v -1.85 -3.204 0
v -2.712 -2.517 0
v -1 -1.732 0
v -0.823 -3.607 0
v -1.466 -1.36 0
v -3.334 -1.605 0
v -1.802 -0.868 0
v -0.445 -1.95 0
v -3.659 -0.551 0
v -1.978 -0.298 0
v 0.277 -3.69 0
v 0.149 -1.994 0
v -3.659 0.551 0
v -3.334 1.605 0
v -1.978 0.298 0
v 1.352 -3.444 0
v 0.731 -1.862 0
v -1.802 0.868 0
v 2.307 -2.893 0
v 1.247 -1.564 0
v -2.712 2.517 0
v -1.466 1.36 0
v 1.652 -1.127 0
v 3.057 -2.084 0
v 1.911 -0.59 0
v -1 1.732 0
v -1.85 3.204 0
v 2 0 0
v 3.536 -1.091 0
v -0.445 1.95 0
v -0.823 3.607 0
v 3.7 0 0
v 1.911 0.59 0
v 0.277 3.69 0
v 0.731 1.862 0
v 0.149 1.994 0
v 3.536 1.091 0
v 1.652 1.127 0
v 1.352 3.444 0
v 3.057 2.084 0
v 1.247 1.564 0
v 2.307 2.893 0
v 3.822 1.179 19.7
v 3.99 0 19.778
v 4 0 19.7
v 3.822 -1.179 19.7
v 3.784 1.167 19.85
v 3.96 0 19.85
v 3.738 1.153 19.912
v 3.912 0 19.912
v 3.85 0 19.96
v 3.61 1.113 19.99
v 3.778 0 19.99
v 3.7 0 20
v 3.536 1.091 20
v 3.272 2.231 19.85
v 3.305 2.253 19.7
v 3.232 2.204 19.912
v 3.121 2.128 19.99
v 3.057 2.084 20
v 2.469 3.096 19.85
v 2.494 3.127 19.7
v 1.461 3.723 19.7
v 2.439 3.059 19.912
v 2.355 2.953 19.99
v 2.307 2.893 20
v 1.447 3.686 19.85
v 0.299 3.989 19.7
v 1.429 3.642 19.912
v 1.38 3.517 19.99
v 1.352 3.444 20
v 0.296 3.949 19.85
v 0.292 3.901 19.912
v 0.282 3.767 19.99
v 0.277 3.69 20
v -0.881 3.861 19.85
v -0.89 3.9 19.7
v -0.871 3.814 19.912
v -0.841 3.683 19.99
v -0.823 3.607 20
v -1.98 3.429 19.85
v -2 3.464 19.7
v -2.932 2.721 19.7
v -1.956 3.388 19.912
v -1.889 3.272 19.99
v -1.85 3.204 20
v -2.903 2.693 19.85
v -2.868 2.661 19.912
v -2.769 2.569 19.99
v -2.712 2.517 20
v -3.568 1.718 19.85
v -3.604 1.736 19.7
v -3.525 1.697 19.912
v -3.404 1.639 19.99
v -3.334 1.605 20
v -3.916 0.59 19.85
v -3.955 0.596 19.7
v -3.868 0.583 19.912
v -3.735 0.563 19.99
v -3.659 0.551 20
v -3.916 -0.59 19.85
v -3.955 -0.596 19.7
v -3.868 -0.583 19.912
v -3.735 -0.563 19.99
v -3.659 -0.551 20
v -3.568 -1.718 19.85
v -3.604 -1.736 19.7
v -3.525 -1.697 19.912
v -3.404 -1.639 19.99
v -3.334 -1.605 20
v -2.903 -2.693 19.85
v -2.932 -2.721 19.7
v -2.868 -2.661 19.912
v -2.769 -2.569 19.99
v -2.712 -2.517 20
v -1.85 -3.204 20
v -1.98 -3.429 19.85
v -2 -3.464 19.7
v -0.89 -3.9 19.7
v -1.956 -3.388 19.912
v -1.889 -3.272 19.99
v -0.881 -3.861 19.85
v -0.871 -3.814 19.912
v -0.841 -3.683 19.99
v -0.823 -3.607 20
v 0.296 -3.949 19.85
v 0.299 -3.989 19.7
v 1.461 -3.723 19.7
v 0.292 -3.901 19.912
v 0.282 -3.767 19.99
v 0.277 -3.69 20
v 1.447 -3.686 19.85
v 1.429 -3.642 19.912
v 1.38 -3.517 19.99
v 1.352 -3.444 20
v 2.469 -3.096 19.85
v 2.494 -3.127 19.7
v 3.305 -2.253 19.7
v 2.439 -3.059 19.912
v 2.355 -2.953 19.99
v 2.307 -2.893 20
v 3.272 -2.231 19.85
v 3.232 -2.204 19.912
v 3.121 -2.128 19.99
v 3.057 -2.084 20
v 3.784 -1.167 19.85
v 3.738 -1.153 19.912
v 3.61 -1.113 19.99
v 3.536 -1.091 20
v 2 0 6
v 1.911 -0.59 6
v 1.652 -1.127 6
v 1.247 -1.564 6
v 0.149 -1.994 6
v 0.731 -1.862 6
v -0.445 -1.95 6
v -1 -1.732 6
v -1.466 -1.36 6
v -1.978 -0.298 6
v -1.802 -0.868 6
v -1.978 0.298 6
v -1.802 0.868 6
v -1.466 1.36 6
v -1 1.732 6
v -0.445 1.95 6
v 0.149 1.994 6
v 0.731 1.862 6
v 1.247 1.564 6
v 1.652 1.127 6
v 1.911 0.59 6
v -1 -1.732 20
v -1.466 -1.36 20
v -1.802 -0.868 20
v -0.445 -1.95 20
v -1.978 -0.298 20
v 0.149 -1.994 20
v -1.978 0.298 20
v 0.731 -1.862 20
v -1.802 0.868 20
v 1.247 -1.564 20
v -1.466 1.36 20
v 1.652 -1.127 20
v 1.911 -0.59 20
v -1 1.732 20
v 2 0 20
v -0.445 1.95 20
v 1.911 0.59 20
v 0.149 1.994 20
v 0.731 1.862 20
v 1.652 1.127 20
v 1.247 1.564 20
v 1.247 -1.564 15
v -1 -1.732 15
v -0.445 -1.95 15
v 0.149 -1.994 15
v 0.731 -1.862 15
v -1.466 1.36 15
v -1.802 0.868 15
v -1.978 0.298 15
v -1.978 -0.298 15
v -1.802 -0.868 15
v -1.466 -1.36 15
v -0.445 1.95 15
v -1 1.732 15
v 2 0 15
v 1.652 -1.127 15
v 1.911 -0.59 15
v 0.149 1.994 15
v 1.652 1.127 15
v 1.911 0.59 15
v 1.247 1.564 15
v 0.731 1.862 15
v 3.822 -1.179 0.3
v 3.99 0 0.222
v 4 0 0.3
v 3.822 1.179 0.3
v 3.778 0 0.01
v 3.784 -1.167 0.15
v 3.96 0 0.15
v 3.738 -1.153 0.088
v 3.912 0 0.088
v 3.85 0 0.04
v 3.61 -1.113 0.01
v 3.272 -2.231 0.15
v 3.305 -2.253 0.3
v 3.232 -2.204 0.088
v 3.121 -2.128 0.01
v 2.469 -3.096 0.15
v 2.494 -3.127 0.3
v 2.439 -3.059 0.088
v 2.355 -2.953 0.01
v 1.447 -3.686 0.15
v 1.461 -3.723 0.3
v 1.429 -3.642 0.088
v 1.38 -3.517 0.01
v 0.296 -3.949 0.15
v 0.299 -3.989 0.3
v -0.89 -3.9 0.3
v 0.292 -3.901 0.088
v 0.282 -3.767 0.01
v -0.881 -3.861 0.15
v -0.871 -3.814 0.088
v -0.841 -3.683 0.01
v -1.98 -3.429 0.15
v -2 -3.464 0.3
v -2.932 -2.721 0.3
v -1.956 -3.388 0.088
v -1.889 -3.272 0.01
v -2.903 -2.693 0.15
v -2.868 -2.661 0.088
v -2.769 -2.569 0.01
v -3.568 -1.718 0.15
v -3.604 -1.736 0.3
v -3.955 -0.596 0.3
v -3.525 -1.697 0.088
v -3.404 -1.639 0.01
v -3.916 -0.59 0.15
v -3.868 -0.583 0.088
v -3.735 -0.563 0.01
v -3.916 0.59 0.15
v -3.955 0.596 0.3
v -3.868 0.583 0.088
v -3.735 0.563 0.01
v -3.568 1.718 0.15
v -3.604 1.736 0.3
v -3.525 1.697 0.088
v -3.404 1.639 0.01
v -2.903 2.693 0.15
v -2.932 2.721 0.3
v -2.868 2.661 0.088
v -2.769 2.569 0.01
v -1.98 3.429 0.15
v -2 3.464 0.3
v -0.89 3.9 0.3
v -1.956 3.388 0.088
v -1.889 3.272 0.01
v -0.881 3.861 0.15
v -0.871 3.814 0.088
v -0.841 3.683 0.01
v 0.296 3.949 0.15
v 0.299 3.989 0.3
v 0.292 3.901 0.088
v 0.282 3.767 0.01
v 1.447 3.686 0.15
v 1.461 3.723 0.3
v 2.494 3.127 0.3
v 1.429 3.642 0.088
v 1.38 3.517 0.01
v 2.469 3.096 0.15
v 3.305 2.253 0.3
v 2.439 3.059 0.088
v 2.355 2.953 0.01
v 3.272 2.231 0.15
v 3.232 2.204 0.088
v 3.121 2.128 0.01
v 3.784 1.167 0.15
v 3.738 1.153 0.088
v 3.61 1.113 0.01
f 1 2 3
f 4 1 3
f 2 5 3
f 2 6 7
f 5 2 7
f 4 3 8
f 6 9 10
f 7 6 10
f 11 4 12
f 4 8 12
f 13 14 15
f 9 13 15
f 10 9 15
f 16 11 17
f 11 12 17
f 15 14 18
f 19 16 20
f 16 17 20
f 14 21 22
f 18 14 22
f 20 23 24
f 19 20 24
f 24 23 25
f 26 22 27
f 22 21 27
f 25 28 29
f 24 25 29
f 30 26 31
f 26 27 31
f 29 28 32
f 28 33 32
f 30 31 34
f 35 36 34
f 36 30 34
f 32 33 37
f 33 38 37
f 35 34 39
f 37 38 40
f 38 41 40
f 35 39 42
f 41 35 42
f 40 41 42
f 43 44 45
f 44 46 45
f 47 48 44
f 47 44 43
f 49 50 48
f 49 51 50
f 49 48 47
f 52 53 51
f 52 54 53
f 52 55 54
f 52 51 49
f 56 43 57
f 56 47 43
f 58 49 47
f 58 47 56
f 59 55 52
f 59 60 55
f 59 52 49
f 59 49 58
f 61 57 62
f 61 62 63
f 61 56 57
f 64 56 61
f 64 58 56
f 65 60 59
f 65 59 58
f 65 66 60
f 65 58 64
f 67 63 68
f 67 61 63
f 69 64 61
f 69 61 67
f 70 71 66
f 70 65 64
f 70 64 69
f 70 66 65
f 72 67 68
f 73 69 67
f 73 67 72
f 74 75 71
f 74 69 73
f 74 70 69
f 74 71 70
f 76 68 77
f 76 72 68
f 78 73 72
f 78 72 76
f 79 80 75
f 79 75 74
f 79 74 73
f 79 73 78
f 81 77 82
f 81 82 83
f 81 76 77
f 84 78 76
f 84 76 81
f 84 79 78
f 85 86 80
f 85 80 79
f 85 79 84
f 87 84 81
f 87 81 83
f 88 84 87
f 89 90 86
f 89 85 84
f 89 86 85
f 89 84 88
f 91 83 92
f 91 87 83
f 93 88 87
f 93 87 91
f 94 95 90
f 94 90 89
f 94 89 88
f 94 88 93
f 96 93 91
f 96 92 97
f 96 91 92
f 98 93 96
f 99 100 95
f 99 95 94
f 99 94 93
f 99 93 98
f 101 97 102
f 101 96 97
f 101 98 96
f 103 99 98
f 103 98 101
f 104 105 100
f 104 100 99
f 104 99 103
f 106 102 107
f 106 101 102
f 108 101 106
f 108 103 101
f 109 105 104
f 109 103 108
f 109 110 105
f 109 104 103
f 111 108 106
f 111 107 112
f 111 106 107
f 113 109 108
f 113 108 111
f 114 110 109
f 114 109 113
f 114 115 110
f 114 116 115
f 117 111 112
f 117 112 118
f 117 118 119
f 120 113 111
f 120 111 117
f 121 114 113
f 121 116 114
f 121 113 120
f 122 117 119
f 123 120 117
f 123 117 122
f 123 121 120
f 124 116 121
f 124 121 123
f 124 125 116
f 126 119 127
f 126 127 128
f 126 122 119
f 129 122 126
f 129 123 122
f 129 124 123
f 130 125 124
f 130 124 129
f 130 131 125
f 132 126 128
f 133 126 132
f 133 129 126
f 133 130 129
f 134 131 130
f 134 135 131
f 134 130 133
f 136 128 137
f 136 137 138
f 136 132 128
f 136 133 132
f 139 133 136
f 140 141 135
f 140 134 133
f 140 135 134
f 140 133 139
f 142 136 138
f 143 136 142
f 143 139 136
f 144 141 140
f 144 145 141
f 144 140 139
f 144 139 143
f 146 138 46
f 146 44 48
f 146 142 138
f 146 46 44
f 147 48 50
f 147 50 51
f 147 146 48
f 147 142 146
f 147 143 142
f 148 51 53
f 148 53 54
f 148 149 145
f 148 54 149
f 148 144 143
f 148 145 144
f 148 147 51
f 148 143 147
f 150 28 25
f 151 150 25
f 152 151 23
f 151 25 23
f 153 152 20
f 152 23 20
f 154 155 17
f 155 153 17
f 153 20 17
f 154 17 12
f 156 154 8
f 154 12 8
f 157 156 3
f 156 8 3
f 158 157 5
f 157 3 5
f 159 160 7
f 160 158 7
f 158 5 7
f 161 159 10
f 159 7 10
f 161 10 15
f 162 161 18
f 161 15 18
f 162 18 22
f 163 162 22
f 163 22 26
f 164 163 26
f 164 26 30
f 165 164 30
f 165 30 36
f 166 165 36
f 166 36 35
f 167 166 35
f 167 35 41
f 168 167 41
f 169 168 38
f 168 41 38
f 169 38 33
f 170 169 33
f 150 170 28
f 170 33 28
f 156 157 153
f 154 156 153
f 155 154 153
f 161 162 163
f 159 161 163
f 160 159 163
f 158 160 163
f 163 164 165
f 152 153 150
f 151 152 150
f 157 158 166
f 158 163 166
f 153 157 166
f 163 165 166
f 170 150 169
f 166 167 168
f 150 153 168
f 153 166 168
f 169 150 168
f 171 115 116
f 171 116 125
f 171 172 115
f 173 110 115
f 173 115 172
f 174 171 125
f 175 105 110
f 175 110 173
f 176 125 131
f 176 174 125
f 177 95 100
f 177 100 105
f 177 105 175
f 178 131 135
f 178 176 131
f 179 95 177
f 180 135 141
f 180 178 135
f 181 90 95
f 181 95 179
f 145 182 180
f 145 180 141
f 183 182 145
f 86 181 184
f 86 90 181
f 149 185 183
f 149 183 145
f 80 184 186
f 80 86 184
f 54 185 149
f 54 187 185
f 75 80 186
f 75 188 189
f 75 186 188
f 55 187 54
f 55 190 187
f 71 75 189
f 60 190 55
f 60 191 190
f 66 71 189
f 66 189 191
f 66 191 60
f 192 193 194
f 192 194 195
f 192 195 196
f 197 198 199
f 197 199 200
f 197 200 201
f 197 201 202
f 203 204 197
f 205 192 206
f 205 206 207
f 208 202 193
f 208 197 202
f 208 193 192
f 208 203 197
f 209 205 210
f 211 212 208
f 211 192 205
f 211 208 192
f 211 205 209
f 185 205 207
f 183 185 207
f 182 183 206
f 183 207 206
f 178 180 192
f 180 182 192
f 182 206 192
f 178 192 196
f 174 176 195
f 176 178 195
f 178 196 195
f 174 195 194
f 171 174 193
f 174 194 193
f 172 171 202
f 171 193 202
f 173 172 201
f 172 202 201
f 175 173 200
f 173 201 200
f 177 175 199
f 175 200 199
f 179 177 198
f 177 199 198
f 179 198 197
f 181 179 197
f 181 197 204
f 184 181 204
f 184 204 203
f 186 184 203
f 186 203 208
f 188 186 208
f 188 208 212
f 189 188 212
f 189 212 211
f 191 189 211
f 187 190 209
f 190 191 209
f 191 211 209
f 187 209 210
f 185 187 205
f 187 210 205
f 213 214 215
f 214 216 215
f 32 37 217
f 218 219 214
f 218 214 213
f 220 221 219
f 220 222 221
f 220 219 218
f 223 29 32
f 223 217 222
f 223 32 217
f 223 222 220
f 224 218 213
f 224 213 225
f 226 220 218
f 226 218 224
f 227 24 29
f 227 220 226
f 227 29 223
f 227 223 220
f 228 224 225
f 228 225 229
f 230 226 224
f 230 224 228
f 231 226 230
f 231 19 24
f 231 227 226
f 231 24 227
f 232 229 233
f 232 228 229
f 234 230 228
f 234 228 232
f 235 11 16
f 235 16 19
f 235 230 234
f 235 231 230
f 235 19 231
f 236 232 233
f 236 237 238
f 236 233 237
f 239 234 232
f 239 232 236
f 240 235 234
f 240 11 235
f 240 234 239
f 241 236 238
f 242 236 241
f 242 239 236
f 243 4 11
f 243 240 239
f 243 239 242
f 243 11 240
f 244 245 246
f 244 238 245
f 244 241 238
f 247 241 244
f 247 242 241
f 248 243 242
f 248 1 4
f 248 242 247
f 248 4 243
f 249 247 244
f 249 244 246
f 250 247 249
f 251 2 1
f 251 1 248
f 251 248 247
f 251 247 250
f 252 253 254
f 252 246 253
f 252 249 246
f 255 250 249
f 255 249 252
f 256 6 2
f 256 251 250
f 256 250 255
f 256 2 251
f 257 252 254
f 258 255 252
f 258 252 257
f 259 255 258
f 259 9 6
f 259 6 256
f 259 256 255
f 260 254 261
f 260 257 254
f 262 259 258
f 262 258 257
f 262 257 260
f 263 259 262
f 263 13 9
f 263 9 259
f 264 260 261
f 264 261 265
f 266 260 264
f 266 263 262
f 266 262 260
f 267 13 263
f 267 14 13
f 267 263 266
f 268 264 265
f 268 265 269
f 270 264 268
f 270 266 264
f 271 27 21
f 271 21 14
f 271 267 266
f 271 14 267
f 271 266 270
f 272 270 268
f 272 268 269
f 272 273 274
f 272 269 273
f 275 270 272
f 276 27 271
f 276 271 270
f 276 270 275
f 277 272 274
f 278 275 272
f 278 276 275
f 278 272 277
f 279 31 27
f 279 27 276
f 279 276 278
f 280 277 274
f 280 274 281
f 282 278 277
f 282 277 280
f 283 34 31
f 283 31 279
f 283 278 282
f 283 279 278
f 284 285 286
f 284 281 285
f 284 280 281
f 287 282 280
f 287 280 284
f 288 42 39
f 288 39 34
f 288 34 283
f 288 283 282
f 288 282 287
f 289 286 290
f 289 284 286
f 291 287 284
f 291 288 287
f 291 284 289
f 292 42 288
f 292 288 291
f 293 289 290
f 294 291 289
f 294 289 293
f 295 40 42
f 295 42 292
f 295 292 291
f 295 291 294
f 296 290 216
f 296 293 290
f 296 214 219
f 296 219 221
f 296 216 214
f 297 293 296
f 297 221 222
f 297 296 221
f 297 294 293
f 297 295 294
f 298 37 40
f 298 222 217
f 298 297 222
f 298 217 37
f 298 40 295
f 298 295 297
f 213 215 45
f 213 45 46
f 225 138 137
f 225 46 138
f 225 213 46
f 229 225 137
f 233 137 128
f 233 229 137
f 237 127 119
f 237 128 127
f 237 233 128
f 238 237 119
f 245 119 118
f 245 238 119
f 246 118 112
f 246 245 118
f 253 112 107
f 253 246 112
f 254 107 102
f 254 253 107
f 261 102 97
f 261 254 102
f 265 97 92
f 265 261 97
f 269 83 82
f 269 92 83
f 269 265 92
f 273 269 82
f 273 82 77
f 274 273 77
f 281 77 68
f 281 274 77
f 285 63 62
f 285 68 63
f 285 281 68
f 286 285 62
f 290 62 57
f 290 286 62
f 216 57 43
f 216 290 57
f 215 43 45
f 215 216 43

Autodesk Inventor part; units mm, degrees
ref_plane "YZ Plane" through (0, 0, 0) normal (1, 0, 0) x (0, 1, 0)
ref_plane "XZ Plane" through (0, 0, 0) normal (0, 1, 0) x (-1, 0, 0)
ref_plane "XY Plane" through (0, 0, 0) normal (0, 0, 1) x (1, 0, 0)
sketch "スケッチ1" plane through (0, 0, 0) normal (0, 0, 1) x (1, 0, 0)
  circle A0 centre (0, 0) radius 4
  circle A1 centre (0, 0) radius 2
  dimension "d0" = 8
  dimension "d1" = 4
extrude "押し出し1" add sketch "スケッチ1" along normal blind 20
fillet "フィレット1" radius 0.3 2 edges at (-4, 0, 20) (-4, 0, 0)
thread "ねじ1" size "M4x0.7" class "6H" standard "ANSI Metric M Profile" length 100
extrude "押し出し2" add sketch "スケッチ1" along normal blind 15 contours A1
extrude "押し出し3" cut sketch "スケッチ1" along normal blind 6 contours A1
thread "ねじ2" size "M4x0.7" class "6H" standard "ANSI Metric M Profile" full length
properties part number "スペーサーM4L20アルミ" material "アルミニウム 2014-T4"
